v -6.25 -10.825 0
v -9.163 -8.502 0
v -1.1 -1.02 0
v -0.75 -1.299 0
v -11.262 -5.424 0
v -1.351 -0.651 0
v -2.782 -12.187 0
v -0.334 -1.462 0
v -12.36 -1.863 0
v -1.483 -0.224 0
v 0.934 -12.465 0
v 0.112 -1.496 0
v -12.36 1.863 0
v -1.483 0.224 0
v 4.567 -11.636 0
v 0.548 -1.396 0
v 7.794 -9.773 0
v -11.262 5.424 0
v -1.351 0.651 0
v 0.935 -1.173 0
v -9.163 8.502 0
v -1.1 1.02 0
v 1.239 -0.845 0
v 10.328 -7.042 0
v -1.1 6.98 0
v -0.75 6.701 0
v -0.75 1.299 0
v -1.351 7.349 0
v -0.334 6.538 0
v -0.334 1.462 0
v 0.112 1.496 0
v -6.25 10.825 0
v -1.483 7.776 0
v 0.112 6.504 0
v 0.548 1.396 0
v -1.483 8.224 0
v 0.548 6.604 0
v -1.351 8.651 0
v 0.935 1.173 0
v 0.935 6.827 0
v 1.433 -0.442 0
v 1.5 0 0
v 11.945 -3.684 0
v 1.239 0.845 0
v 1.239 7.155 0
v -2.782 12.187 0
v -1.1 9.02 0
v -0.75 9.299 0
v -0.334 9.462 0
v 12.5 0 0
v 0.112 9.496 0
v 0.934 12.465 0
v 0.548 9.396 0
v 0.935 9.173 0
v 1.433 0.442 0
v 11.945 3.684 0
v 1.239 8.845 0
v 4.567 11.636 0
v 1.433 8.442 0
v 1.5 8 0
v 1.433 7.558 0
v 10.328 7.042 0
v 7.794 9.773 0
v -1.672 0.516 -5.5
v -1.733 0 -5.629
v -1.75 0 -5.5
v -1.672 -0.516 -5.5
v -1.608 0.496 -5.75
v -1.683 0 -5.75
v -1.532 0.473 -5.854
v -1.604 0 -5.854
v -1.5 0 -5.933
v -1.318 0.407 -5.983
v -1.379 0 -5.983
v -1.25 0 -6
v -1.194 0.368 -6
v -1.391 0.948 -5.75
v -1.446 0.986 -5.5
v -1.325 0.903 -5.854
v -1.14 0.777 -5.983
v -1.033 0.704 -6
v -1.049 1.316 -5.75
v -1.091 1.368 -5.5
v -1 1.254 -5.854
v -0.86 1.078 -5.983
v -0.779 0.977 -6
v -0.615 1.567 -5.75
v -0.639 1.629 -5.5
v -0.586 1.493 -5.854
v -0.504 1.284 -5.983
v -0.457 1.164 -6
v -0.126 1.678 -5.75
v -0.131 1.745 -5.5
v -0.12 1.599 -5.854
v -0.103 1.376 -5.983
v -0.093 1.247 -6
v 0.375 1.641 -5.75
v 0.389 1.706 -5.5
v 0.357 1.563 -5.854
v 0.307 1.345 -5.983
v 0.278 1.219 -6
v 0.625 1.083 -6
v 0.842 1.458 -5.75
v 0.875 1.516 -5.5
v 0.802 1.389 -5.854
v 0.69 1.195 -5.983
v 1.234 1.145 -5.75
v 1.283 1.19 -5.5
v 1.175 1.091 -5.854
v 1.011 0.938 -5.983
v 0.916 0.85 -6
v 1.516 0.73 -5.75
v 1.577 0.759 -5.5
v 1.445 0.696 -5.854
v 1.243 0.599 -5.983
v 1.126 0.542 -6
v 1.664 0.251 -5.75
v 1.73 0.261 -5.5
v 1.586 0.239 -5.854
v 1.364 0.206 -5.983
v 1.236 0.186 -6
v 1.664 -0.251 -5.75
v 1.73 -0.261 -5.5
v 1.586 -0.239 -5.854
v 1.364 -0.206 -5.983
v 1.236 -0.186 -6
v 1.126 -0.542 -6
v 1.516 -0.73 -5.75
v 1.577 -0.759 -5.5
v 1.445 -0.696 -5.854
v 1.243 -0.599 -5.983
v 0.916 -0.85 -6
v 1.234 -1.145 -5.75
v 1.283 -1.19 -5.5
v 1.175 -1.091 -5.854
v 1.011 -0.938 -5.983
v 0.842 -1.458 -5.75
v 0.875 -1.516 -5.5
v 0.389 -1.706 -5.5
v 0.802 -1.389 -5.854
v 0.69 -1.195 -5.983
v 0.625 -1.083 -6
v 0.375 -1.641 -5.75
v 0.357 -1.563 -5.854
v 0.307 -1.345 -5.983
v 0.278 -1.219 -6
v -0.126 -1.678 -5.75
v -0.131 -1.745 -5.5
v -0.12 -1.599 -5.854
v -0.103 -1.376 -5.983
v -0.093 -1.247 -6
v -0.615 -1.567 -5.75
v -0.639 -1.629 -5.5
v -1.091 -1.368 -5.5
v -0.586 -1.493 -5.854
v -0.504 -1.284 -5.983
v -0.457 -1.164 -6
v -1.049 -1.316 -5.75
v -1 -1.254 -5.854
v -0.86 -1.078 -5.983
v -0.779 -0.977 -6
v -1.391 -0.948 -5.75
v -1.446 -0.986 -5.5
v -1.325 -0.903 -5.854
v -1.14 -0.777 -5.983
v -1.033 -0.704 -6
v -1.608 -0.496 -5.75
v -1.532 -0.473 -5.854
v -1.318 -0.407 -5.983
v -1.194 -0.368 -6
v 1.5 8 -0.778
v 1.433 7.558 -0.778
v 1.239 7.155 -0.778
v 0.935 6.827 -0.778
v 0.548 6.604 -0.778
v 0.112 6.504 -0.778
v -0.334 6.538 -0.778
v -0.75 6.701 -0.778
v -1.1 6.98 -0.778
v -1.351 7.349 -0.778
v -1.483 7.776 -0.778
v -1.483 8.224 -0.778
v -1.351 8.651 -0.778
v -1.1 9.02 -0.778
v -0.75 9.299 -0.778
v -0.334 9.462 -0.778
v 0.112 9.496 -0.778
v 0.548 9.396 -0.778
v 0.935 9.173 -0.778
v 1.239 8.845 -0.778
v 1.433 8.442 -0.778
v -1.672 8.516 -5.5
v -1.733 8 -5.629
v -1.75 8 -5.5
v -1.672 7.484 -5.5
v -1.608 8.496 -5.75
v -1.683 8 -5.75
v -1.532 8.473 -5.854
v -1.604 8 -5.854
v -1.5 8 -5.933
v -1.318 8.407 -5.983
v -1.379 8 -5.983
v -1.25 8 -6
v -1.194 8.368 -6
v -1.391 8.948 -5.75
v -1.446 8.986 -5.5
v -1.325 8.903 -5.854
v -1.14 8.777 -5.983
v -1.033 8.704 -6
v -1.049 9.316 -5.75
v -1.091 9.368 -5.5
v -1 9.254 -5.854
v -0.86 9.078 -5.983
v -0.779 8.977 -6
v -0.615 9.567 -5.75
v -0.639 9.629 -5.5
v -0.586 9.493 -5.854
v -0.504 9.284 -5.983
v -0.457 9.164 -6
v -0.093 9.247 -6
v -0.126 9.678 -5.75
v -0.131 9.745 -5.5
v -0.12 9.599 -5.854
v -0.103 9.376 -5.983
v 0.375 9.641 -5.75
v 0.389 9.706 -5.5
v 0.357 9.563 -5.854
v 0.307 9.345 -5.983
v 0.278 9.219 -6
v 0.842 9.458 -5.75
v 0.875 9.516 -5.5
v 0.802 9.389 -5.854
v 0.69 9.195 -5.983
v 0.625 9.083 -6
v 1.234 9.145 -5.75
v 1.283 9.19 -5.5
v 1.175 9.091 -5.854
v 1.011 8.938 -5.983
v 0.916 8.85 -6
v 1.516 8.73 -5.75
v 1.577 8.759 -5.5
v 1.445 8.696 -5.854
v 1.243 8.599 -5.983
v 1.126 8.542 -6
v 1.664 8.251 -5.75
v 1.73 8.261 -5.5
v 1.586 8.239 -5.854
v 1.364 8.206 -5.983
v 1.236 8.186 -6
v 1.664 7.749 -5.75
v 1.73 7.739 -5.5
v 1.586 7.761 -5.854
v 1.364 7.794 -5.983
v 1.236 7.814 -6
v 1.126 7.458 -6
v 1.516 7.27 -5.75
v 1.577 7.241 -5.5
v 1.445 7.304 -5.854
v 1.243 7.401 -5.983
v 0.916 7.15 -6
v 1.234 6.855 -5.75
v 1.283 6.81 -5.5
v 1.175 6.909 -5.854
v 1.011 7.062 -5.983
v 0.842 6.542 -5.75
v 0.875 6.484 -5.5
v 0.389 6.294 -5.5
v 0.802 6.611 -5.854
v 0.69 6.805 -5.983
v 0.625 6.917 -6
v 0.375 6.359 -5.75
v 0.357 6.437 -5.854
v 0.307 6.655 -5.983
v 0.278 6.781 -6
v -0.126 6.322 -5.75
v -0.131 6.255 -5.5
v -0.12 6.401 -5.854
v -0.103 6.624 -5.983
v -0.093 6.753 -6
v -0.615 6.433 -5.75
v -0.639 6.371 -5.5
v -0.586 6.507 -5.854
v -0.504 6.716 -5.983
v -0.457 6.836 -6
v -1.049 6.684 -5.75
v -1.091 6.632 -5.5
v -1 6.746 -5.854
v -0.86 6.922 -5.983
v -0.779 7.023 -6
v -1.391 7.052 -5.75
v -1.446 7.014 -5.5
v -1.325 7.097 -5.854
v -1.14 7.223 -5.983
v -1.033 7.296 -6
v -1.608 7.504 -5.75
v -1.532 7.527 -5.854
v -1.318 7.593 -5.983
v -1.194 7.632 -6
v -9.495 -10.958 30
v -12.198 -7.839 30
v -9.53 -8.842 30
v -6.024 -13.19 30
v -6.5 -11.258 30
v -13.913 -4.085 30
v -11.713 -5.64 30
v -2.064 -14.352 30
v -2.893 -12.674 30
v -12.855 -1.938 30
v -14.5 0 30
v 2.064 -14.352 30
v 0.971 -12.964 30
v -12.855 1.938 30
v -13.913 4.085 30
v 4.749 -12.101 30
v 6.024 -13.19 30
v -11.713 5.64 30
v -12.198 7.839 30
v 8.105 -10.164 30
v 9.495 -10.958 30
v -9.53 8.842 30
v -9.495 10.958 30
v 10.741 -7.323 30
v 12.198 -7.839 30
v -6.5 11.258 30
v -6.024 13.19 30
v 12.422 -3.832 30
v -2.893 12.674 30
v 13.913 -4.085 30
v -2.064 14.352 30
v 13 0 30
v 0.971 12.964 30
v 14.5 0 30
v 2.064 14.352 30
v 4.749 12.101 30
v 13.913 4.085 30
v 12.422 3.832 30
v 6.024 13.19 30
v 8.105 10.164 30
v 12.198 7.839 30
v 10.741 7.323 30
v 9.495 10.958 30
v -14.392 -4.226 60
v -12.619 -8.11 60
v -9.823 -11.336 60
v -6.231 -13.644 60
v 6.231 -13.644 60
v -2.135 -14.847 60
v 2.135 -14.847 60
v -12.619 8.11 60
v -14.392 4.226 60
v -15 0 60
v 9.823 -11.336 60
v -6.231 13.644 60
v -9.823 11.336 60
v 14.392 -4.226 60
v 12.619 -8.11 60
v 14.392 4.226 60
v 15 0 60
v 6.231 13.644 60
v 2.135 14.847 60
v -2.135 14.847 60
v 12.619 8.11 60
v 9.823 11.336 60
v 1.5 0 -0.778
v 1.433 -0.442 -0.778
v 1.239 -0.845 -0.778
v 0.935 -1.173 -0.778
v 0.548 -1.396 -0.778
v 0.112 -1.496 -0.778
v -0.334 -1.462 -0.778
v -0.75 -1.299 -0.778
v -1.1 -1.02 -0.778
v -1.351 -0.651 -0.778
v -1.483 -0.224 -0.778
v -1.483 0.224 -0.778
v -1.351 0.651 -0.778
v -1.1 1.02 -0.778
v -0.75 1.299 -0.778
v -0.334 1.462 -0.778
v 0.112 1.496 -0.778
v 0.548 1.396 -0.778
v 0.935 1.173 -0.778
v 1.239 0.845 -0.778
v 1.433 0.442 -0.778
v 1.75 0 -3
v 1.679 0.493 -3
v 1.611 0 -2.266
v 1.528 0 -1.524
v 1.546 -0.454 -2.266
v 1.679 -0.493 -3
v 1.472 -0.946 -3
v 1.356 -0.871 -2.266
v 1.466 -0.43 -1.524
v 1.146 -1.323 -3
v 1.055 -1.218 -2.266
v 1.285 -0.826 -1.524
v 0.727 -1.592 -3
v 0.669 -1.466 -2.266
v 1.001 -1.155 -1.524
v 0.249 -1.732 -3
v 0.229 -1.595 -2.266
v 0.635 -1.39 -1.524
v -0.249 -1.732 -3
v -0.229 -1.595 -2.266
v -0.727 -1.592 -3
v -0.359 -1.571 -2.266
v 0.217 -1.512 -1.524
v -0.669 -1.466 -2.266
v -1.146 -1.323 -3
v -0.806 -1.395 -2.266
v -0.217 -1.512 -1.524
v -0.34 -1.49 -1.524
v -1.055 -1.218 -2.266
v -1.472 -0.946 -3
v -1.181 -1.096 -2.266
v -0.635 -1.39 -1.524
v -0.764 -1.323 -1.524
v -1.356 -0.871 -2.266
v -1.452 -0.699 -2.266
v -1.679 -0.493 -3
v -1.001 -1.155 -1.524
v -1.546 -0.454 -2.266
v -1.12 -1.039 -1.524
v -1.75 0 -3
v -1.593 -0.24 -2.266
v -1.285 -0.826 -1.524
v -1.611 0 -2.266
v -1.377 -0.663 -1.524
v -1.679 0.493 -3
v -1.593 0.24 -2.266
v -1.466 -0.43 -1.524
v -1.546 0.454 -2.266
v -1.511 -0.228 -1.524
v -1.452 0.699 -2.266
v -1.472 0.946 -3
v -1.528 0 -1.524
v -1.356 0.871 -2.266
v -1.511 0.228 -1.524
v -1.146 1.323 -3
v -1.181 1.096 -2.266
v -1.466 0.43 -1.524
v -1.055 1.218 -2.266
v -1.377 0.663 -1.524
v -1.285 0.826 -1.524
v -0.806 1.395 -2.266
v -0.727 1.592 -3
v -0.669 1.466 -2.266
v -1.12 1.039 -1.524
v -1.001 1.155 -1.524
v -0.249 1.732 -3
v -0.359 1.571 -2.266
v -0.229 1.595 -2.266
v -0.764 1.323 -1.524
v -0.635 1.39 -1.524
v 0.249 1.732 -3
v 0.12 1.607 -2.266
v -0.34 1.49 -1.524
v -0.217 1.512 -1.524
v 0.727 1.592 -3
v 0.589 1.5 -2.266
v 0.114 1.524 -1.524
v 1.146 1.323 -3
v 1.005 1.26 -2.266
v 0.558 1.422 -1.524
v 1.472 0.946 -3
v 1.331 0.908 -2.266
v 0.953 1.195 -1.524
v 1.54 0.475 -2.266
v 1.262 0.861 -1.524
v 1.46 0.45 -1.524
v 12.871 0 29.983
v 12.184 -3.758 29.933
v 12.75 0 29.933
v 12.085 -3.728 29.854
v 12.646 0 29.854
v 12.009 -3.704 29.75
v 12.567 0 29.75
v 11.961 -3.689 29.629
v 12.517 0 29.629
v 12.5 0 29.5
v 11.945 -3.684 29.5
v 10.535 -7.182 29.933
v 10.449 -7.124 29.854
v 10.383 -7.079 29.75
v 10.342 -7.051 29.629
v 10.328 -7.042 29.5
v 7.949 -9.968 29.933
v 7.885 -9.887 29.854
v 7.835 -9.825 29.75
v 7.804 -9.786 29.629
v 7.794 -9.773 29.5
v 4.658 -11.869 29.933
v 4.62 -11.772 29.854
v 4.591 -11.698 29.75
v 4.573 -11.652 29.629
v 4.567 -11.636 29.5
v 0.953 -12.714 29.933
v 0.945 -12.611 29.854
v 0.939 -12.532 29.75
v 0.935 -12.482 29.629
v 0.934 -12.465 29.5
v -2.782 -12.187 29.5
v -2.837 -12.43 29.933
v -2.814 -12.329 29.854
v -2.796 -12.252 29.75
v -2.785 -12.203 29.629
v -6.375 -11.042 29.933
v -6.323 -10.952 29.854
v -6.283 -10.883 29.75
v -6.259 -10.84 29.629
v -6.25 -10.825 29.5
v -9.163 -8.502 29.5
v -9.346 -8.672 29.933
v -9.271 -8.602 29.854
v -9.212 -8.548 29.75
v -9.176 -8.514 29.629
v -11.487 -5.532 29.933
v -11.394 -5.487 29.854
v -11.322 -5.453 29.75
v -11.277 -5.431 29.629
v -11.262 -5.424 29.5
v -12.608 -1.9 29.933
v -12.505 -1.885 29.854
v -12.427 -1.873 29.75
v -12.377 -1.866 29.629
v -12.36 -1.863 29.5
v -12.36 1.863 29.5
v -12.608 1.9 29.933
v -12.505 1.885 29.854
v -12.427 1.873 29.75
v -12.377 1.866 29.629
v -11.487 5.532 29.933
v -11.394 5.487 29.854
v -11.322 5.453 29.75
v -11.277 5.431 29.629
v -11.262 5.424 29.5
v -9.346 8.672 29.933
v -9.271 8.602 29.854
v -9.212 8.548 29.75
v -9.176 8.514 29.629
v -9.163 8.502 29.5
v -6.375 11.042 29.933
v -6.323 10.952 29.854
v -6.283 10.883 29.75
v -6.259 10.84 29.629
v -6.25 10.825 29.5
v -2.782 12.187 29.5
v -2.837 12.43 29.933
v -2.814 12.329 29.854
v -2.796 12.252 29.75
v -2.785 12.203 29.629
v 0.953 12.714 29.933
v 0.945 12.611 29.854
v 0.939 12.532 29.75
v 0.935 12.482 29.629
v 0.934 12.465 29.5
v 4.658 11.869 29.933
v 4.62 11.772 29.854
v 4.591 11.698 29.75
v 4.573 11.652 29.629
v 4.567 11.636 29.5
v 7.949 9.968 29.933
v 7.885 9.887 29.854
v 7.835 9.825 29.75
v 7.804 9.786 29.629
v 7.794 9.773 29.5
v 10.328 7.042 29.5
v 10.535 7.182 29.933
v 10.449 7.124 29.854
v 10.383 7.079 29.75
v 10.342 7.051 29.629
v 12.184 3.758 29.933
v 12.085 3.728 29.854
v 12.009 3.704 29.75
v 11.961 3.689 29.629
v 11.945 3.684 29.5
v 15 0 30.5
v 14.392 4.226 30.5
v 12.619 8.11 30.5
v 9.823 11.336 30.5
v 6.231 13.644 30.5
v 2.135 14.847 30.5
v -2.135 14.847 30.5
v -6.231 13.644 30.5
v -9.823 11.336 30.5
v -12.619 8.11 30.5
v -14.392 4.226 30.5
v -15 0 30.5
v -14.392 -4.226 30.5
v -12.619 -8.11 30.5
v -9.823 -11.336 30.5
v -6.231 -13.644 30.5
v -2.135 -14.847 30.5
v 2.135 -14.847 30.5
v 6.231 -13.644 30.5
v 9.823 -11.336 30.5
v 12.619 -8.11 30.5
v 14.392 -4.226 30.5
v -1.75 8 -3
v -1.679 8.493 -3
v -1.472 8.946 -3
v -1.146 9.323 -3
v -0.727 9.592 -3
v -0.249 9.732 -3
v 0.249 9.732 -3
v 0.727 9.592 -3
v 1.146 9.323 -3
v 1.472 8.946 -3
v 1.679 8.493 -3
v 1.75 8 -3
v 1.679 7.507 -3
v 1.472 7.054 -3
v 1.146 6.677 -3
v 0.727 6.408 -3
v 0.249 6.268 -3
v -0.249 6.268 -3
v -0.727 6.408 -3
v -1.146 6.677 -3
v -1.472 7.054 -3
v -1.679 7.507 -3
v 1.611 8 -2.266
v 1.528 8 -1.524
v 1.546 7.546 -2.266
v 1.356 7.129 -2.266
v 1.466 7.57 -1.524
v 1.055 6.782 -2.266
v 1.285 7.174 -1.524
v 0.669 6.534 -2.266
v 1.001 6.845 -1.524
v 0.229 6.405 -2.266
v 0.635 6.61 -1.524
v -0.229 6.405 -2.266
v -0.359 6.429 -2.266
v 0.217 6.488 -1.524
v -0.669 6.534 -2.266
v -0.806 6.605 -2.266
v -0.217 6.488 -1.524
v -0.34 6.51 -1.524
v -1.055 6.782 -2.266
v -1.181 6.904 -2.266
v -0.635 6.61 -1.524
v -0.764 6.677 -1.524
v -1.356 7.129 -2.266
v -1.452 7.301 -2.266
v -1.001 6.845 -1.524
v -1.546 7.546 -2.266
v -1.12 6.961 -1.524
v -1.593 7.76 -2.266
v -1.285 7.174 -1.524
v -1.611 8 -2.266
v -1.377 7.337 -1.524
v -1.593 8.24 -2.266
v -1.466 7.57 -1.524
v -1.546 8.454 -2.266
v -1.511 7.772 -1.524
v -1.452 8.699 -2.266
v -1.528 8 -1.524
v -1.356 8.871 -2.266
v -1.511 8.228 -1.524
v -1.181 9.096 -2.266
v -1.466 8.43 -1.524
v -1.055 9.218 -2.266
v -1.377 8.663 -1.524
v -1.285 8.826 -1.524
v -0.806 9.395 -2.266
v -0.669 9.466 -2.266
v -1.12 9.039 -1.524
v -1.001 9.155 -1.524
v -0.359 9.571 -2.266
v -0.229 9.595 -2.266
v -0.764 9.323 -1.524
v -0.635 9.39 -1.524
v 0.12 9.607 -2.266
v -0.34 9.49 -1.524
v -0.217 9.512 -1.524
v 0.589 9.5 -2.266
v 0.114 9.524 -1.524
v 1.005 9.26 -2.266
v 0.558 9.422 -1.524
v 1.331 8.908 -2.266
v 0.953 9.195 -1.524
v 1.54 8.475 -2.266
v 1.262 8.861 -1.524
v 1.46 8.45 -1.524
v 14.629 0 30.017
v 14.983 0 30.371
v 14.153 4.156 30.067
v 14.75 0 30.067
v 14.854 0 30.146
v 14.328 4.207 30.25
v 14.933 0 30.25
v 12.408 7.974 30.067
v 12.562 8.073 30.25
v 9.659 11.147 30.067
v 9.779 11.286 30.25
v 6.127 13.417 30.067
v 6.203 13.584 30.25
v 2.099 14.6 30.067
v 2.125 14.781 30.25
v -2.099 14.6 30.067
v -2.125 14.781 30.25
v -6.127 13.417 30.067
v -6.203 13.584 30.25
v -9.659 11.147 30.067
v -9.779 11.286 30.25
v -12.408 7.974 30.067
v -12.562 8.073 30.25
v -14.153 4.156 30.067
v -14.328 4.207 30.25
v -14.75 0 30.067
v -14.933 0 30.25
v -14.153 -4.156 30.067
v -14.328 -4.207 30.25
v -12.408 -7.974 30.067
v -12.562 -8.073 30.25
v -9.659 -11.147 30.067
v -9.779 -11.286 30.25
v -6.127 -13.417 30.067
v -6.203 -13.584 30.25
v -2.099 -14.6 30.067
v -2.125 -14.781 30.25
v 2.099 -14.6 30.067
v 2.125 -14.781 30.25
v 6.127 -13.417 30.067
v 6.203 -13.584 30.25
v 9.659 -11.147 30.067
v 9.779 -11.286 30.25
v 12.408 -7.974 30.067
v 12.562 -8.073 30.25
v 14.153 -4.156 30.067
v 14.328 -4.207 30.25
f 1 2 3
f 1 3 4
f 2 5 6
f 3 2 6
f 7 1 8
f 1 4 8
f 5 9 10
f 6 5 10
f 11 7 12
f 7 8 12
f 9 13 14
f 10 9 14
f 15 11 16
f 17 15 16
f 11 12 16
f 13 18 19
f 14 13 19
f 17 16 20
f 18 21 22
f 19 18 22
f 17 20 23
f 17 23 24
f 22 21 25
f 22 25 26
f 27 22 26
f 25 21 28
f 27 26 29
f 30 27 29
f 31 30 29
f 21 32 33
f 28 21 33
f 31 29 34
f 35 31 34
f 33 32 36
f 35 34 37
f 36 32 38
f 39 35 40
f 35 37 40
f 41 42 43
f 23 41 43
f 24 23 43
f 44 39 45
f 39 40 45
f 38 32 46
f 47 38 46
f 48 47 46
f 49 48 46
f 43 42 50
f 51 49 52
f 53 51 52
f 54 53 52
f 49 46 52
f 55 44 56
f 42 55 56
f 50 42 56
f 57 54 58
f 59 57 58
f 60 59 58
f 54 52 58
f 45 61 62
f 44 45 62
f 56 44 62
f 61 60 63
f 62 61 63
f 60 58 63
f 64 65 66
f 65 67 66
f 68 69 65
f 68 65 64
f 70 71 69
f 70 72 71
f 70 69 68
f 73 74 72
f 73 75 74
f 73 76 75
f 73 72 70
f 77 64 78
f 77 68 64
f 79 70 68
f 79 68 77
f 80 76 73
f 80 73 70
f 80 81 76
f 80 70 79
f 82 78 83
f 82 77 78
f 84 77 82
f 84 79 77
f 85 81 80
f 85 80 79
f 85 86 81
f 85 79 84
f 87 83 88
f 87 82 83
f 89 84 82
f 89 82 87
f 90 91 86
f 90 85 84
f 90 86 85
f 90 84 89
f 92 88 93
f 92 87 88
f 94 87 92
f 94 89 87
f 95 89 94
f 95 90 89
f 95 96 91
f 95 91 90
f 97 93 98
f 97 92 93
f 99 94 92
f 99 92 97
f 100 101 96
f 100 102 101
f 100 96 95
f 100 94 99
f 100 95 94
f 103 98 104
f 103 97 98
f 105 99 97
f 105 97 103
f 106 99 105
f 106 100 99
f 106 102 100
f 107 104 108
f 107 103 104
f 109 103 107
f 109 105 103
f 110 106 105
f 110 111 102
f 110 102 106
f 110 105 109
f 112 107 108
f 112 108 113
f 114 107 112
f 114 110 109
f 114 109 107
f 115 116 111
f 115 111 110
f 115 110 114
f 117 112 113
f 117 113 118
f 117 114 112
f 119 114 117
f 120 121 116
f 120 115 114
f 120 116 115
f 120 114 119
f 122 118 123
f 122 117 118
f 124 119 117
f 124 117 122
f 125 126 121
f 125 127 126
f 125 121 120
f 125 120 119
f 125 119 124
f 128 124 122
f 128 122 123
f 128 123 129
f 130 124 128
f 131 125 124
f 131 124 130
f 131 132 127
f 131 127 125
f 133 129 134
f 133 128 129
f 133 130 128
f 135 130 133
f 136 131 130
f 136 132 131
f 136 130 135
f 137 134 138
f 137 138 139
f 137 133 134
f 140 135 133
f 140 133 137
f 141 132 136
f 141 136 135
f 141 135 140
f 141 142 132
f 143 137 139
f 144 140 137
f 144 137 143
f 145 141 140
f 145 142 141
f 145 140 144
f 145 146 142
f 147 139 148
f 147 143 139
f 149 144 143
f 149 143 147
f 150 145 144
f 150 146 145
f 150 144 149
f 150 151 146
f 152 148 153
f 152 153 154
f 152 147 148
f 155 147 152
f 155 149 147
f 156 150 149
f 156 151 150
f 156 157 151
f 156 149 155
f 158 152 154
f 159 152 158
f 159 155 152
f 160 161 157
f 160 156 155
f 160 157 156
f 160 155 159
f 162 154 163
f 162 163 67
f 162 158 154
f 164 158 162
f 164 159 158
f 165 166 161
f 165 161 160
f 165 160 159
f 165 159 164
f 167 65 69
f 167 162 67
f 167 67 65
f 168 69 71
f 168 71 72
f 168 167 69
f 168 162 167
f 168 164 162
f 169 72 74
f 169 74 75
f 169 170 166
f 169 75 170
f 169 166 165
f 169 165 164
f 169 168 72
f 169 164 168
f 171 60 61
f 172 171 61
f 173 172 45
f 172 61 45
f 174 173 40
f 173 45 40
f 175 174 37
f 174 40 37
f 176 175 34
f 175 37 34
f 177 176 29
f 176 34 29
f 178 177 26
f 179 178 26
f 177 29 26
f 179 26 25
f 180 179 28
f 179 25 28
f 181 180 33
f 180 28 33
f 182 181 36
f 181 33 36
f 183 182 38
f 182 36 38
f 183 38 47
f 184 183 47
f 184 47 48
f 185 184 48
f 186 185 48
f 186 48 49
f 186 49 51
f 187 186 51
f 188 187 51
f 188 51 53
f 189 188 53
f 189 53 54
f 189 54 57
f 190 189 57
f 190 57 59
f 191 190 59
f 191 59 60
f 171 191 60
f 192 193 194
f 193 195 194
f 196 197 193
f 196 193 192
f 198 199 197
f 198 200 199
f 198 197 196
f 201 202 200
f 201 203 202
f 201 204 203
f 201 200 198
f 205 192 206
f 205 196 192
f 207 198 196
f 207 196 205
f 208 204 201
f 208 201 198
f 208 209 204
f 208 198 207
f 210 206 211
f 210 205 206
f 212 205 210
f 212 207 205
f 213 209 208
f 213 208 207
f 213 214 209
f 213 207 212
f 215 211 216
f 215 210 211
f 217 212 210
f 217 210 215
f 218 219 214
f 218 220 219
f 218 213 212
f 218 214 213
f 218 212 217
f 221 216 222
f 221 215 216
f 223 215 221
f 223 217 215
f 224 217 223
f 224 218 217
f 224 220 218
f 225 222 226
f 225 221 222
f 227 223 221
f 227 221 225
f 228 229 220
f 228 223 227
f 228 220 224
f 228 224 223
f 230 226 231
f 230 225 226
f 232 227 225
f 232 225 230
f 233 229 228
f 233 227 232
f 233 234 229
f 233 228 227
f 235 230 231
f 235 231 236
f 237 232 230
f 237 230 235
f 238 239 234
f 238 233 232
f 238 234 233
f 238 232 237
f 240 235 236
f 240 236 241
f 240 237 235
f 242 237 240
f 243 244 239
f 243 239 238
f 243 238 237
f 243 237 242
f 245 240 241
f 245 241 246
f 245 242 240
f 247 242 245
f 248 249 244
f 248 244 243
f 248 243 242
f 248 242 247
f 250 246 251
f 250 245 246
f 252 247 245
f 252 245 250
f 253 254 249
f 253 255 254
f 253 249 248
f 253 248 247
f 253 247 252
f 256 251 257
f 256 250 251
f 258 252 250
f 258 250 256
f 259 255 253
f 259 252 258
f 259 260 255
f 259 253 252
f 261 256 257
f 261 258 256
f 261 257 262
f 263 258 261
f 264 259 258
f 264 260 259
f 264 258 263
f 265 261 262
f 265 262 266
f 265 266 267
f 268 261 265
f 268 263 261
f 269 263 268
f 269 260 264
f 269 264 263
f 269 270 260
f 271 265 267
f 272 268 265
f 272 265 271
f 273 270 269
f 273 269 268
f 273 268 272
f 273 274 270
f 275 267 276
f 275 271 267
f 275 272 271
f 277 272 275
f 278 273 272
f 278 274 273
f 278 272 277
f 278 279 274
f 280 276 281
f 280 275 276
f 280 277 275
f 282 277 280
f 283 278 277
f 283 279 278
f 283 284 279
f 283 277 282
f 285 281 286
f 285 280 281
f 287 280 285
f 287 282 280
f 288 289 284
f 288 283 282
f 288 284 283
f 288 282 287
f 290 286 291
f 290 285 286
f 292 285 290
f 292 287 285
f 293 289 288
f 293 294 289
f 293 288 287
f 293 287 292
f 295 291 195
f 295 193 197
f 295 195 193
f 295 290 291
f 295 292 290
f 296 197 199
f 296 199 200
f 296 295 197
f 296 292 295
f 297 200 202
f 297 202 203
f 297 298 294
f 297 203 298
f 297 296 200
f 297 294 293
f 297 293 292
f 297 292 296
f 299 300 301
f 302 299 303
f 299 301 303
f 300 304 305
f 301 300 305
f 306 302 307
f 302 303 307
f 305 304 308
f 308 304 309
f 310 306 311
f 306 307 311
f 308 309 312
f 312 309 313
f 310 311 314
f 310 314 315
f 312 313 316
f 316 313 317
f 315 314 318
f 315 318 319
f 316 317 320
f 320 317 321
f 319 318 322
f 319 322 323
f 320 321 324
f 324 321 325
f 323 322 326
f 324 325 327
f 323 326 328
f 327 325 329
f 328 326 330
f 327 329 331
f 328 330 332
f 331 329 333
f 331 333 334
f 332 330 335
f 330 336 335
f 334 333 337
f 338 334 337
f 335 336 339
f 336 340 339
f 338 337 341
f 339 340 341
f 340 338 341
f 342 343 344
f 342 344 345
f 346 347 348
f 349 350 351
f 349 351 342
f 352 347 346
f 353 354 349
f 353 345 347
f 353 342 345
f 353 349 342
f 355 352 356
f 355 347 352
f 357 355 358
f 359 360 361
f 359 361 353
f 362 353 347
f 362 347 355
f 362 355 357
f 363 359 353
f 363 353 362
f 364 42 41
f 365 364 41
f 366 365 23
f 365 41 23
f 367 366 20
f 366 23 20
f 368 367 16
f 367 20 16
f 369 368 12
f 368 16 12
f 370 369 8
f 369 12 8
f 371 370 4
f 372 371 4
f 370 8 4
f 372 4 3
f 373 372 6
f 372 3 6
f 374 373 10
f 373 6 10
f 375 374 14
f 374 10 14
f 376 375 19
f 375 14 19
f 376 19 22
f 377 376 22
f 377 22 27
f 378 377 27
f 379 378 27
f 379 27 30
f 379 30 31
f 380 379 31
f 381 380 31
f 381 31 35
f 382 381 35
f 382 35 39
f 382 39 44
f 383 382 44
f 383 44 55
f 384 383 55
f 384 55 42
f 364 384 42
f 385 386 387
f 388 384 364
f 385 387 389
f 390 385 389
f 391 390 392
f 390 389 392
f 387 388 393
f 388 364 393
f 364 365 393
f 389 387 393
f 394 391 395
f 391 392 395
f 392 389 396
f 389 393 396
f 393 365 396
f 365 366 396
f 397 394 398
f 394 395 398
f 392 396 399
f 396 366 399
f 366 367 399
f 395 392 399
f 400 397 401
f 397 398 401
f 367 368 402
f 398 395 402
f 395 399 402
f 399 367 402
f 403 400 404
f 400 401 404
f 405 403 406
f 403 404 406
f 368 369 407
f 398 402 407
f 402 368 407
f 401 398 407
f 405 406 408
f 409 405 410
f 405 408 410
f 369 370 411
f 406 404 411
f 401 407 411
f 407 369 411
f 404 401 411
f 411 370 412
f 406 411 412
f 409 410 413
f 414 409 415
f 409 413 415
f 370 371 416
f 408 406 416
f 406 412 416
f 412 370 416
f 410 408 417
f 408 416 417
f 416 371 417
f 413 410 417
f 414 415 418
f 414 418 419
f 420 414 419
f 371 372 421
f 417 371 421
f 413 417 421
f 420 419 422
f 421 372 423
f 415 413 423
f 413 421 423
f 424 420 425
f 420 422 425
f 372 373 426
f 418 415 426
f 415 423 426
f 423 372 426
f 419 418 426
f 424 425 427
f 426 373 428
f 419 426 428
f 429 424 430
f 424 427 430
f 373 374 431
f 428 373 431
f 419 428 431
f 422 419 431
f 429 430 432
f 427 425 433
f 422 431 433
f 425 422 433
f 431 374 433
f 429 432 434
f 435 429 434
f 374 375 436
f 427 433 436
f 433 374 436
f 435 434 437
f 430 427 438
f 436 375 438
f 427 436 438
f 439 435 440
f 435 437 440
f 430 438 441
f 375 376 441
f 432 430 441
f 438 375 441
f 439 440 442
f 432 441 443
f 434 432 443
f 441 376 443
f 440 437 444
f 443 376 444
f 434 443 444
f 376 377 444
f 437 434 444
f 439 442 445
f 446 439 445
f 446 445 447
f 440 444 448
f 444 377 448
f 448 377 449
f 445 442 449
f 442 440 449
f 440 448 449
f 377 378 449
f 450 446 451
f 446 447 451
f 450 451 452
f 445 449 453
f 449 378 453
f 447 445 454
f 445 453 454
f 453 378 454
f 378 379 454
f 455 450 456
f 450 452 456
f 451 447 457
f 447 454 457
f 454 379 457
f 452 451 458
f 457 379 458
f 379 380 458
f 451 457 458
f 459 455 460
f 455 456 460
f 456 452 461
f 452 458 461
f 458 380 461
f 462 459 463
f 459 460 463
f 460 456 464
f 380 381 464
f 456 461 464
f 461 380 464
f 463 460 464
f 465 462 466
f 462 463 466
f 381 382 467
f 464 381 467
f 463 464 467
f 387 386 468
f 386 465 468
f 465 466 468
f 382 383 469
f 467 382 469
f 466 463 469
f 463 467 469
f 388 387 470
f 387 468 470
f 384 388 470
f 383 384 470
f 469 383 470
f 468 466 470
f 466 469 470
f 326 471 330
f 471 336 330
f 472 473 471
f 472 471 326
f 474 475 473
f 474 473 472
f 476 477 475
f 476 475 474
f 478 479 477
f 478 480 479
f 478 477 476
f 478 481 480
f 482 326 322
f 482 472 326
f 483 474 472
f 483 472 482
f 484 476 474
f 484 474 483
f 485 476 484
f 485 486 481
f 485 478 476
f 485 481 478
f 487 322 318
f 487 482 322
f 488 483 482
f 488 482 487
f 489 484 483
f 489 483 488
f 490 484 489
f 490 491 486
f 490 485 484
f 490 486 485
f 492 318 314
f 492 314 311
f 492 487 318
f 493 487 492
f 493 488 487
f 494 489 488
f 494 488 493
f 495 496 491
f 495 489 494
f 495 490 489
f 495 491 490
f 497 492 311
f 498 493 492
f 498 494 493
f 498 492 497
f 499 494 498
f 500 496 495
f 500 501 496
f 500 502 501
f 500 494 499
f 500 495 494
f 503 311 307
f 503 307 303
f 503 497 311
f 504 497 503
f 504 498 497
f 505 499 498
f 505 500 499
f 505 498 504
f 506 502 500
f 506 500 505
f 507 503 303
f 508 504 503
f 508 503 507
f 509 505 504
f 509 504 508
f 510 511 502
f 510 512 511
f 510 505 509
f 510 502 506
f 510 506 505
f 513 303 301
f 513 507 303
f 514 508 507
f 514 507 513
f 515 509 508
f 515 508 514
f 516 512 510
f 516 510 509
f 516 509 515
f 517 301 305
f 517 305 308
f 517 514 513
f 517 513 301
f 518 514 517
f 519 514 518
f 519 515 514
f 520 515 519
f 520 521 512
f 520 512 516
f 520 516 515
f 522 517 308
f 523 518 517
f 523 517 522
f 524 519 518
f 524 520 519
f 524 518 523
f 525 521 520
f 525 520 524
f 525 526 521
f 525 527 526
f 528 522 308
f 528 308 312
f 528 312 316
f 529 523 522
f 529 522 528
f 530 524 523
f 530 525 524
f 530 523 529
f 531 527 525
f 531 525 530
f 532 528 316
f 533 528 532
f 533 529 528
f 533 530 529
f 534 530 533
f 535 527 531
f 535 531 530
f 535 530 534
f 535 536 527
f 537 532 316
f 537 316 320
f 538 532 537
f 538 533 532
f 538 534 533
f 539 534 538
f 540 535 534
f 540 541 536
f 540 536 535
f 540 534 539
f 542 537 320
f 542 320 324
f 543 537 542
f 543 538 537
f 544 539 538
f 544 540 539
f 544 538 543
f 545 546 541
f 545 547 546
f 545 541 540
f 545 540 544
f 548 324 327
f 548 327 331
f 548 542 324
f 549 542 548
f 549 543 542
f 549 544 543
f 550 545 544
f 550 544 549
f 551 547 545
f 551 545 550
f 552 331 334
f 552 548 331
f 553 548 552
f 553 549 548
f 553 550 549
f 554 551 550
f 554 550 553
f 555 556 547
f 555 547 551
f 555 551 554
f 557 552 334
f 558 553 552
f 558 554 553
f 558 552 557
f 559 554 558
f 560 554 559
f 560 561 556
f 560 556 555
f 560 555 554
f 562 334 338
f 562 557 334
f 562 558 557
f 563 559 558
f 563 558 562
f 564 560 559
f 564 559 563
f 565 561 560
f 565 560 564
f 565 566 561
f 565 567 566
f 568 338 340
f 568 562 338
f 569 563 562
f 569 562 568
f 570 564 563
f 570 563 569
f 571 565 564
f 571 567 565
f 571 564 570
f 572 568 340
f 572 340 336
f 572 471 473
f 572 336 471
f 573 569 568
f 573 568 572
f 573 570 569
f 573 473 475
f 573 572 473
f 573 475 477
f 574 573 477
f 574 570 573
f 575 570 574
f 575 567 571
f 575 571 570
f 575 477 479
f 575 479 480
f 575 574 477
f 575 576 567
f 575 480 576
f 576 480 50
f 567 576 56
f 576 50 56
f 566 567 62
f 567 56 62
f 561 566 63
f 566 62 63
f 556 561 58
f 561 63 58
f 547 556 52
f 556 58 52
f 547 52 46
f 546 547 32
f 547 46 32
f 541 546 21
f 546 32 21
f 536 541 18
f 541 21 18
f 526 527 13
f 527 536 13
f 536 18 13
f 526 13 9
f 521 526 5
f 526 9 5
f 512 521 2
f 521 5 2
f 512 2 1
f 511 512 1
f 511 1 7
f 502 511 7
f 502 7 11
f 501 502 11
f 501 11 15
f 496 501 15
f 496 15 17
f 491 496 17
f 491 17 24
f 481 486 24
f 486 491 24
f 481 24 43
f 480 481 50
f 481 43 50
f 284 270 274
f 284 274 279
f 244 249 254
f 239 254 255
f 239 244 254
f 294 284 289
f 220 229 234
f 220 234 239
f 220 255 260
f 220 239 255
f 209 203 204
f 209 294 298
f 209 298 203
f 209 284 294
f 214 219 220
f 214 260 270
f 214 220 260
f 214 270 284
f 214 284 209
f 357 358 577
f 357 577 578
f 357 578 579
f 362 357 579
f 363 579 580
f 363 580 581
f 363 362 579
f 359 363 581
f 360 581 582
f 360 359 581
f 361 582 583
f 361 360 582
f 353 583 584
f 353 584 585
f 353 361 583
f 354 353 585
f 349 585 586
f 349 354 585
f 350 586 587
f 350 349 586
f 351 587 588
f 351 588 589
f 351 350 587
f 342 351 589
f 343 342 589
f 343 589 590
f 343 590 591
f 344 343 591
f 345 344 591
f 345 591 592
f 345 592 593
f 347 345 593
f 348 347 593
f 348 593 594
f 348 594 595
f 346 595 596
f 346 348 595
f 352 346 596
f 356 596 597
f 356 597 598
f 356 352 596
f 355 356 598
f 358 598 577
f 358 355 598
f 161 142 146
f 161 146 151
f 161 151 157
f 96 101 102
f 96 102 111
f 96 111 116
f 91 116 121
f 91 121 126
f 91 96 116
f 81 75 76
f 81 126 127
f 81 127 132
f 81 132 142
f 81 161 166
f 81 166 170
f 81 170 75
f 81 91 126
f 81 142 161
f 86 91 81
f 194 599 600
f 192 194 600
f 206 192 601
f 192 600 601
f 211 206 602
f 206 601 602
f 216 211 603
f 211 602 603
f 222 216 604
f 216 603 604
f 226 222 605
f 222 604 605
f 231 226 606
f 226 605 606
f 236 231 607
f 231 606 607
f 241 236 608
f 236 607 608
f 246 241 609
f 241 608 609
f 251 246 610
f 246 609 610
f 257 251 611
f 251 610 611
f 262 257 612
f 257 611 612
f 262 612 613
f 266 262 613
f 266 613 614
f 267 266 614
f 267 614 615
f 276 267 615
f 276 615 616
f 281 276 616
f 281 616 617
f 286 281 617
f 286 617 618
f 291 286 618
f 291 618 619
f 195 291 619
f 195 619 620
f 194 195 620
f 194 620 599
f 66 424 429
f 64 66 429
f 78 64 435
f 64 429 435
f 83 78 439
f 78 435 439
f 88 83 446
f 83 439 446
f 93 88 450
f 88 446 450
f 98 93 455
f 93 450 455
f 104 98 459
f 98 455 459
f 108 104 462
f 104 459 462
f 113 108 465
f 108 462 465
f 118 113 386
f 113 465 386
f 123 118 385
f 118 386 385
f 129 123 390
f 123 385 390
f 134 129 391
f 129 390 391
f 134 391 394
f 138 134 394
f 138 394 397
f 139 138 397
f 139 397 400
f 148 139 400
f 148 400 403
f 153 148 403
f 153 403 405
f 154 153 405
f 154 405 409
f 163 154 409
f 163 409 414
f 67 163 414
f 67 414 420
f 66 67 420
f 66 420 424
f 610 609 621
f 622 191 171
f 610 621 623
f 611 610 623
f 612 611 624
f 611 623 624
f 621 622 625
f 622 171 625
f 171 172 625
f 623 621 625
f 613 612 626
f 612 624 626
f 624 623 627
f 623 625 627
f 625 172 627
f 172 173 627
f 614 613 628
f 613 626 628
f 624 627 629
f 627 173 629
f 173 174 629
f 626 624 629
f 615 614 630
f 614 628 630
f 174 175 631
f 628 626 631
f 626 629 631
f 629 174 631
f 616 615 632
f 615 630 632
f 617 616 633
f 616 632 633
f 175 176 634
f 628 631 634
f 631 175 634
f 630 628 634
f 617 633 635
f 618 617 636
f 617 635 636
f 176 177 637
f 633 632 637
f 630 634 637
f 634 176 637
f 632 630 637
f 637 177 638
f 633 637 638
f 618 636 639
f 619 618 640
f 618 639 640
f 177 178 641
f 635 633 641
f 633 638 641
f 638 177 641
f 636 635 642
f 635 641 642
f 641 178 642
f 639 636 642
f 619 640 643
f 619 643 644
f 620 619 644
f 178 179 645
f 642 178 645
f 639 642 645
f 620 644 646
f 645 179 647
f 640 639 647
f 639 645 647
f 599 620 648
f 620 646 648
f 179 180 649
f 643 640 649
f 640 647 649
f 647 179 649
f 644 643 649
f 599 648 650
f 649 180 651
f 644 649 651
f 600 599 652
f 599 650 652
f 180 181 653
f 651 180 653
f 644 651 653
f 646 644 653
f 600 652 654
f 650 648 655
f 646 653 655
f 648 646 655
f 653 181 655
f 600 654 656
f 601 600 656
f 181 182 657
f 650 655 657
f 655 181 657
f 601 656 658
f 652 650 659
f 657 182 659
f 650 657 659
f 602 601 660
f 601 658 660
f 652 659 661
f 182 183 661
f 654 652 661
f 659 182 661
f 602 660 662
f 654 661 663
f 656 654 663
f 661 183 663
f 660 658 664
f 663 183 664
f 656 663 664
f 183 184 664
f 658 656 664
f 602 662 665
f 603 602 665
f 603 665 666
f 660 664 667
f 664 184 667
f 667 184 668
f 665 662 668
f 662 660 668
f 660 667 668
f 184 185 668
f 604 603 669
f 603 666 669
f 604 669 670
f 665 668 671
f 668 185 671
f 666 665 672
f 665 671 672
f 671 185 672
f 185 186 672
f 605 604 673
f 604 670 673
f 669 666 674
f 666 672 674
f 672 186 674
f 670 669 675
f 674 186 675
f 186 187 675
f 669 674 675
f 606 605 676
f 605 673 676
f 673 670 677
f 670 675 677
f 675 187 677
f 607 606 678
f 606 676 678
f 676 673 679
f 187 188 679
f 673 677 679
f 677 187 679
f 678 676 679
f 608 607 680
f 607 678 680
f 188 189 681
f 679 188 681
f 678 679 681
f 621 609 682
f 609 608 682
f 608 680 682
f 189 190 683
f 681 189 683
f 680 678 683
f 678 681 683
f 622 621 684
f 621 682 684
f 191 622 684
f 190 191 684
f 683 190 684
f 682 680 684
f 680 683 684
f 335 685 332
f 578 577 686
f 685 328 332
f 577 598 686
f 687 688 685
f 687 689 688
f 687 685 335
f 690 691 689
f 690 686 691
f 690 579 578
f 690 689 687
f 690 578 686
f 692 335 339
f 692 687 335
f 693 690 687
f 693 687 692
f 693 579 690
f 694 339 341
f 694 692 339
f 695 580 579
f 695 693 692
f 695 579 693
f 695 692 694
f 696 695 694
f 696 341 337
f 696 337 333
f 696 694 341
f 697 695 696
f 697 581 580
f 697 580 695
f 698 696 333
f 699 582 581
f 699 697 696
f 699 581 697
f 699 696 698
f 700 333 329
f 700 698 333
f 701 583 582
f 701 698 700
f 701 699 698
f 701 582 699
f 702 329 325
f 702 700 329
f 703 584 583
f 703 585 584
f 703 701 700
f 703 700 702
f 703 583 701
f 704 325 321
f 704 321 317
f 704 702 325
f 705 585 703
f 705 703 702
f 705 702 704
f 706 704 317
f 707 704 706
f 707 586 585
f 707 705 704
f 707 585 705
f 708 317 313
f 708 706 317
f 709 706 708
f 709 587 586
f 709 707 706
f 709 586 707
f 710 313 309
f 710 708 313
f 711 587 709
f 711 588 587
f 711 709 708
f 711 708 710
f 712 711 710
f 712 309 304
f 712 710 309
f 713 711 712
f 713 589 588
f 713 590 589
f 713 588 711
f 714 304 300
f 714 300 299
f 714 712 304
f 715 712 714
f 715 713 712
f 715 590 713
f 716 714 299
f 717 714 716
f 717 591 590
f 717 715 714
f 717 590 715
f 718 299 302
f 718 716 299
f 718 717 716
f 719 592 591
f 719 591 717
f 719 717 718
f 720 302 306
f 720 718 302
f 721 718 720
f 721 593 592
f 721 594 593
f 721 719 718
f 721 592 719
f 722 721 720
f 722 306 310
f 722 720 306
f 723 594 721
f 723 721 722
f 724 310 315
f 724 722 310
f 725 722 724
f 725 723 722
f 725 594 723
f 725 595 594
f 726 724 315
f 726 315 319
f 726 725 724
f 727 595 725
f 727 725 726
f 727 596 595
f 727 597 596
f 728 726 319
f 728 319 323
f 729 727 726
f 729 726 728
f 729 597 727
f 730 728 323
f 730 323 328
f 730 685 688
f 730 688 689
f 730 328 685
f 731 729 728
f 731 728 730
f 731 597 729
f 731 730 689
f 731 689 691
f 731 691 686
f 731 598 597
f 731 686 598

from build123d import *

# Parameters (mm, degrees)
SKETCH_1_R      = 12.5
EXTRUDE_1_DEPTH = 60
SKETCH_3_R      = 1.5
EXTRUDE_2_DEPTH = 3
SKETCH_4_R      = 1.75
EXTRUDE_3_DEPTH = 3
FILLET_1_R      = 10
FILLET_2_R      = 10
FILLET_3_R      = 0.5
SKETCH_5_R      = 15
EXTRUDE_4_DEPTH = 30
FILLET_4_R      = 0.5
FILLET_5_R      = 0.5


with BuildPart() as part:
    # 草图1 → 凸台-拉伸1 (new body)
    with BuildSketch(Plane.XY):
        Circle(SKETCH_1_R)
    extrude(amount=EXTRUDE_1_DEPTH)

    # 草图3 → 凸台-拉伸2 (add)
    with BuildSketch(Plane(origin=(0, 0, 0), x_dir=(-1, 0, 0), z_dir=(0, 0, -1))):
        with Locations(Location((0, 0, 0), (0, 0, 180))):
            Circle(SKETCH_3_R)
        with Locations(Location((0, 8, 0), (0, 0, 180))):
            Circle(SKETCH_3_R)
    extrude(amount=EXTRUDE_2_DEPTH)

    # 草图4 → 凸台-拉伸3 (add)
    with BuildSketch(Plane(origin=(0, 0, -3), x_dir=(-1, 0, 0), z_dir=(0, 0, -1))):
        Circle(SKETCH_4_R)
        with Locations((0, 8)):
            Circle(SKETCH_4_R)
    extrude(amount=EXTRUDE_3_DEPTH)

    # 圆角1
    # the kernel refuses this fillet: 10 mm, written as the material it adds along each edge
    with BuildSketch(Plane(origin=(0, 8, -3), x_dir=(1, 0, 0), z_dir=(0, 1, 0))) as fillet_1_piece_1:
        with BuildLine():
            CenterArc((11.5, -2.222048604), FILLET_1_R, 167.161431859, 12.838568141)
            Line((1.75, 0), (1.5, 0))
            Line((1.5, 0), (1.5, -2.222048604))
        make_face()
    revolve(axis=Axis((0, 8, -3), (0, 0, -1)))

    # 圆角2
    # the kernel refuses this fillet: 10 mm, written as the material it adds along each edge
    with BuildSketch(Plane(origin=(0, 0, -3), x_dir=(1, 0, 0), z_dir=(0, 1, 0))) as fillet_2_piece_1:
        with BuildLine():
            CenterArc((11.5, -2.222048604), FILLET_2_R, 167.161431859, 12.838568141)
            Line((1.75, 0), (1.5, 0))
            Line((1.5, 0), (1.5, -2.222048604))
        make_face()
    revolve(axis=Axis((0, 0, -3), (0, 0, -1)))

    # 圆角3
    fillet_3_edges = [part.edges().sort_by_distance(p)[0] for p in [
        (1.75, 0, -6),
        (1.75, 8, -6),
    ]]
    fillet(fillet_3_edges, radius=FILLET_3_R)

    # 草图5 → 凸台-拉伸4 (add)
    with BuildSketch(Plane.XY.offset(60)):
        Circle(SKETCH_5_R)
    extrude(amount=-EXTRUDE_4_DEPTH)

    # 圆角4
    fillet_4_edges = [part.edges().sort_by_distance(p)[0] for p in [
        (-12.5, 0, 30),
    ]]
    fillet(fillet_4_edges, radius=FILLET_4_R)

    # 圆角5
    fillet_5_edges = [part.edges().sort_by_distance(p)[0] for p in [
        (-15, 0, 30),
    ]]
    fillet(fillet_5_edges, radius=FILLET_5_R)


solid = part.part
